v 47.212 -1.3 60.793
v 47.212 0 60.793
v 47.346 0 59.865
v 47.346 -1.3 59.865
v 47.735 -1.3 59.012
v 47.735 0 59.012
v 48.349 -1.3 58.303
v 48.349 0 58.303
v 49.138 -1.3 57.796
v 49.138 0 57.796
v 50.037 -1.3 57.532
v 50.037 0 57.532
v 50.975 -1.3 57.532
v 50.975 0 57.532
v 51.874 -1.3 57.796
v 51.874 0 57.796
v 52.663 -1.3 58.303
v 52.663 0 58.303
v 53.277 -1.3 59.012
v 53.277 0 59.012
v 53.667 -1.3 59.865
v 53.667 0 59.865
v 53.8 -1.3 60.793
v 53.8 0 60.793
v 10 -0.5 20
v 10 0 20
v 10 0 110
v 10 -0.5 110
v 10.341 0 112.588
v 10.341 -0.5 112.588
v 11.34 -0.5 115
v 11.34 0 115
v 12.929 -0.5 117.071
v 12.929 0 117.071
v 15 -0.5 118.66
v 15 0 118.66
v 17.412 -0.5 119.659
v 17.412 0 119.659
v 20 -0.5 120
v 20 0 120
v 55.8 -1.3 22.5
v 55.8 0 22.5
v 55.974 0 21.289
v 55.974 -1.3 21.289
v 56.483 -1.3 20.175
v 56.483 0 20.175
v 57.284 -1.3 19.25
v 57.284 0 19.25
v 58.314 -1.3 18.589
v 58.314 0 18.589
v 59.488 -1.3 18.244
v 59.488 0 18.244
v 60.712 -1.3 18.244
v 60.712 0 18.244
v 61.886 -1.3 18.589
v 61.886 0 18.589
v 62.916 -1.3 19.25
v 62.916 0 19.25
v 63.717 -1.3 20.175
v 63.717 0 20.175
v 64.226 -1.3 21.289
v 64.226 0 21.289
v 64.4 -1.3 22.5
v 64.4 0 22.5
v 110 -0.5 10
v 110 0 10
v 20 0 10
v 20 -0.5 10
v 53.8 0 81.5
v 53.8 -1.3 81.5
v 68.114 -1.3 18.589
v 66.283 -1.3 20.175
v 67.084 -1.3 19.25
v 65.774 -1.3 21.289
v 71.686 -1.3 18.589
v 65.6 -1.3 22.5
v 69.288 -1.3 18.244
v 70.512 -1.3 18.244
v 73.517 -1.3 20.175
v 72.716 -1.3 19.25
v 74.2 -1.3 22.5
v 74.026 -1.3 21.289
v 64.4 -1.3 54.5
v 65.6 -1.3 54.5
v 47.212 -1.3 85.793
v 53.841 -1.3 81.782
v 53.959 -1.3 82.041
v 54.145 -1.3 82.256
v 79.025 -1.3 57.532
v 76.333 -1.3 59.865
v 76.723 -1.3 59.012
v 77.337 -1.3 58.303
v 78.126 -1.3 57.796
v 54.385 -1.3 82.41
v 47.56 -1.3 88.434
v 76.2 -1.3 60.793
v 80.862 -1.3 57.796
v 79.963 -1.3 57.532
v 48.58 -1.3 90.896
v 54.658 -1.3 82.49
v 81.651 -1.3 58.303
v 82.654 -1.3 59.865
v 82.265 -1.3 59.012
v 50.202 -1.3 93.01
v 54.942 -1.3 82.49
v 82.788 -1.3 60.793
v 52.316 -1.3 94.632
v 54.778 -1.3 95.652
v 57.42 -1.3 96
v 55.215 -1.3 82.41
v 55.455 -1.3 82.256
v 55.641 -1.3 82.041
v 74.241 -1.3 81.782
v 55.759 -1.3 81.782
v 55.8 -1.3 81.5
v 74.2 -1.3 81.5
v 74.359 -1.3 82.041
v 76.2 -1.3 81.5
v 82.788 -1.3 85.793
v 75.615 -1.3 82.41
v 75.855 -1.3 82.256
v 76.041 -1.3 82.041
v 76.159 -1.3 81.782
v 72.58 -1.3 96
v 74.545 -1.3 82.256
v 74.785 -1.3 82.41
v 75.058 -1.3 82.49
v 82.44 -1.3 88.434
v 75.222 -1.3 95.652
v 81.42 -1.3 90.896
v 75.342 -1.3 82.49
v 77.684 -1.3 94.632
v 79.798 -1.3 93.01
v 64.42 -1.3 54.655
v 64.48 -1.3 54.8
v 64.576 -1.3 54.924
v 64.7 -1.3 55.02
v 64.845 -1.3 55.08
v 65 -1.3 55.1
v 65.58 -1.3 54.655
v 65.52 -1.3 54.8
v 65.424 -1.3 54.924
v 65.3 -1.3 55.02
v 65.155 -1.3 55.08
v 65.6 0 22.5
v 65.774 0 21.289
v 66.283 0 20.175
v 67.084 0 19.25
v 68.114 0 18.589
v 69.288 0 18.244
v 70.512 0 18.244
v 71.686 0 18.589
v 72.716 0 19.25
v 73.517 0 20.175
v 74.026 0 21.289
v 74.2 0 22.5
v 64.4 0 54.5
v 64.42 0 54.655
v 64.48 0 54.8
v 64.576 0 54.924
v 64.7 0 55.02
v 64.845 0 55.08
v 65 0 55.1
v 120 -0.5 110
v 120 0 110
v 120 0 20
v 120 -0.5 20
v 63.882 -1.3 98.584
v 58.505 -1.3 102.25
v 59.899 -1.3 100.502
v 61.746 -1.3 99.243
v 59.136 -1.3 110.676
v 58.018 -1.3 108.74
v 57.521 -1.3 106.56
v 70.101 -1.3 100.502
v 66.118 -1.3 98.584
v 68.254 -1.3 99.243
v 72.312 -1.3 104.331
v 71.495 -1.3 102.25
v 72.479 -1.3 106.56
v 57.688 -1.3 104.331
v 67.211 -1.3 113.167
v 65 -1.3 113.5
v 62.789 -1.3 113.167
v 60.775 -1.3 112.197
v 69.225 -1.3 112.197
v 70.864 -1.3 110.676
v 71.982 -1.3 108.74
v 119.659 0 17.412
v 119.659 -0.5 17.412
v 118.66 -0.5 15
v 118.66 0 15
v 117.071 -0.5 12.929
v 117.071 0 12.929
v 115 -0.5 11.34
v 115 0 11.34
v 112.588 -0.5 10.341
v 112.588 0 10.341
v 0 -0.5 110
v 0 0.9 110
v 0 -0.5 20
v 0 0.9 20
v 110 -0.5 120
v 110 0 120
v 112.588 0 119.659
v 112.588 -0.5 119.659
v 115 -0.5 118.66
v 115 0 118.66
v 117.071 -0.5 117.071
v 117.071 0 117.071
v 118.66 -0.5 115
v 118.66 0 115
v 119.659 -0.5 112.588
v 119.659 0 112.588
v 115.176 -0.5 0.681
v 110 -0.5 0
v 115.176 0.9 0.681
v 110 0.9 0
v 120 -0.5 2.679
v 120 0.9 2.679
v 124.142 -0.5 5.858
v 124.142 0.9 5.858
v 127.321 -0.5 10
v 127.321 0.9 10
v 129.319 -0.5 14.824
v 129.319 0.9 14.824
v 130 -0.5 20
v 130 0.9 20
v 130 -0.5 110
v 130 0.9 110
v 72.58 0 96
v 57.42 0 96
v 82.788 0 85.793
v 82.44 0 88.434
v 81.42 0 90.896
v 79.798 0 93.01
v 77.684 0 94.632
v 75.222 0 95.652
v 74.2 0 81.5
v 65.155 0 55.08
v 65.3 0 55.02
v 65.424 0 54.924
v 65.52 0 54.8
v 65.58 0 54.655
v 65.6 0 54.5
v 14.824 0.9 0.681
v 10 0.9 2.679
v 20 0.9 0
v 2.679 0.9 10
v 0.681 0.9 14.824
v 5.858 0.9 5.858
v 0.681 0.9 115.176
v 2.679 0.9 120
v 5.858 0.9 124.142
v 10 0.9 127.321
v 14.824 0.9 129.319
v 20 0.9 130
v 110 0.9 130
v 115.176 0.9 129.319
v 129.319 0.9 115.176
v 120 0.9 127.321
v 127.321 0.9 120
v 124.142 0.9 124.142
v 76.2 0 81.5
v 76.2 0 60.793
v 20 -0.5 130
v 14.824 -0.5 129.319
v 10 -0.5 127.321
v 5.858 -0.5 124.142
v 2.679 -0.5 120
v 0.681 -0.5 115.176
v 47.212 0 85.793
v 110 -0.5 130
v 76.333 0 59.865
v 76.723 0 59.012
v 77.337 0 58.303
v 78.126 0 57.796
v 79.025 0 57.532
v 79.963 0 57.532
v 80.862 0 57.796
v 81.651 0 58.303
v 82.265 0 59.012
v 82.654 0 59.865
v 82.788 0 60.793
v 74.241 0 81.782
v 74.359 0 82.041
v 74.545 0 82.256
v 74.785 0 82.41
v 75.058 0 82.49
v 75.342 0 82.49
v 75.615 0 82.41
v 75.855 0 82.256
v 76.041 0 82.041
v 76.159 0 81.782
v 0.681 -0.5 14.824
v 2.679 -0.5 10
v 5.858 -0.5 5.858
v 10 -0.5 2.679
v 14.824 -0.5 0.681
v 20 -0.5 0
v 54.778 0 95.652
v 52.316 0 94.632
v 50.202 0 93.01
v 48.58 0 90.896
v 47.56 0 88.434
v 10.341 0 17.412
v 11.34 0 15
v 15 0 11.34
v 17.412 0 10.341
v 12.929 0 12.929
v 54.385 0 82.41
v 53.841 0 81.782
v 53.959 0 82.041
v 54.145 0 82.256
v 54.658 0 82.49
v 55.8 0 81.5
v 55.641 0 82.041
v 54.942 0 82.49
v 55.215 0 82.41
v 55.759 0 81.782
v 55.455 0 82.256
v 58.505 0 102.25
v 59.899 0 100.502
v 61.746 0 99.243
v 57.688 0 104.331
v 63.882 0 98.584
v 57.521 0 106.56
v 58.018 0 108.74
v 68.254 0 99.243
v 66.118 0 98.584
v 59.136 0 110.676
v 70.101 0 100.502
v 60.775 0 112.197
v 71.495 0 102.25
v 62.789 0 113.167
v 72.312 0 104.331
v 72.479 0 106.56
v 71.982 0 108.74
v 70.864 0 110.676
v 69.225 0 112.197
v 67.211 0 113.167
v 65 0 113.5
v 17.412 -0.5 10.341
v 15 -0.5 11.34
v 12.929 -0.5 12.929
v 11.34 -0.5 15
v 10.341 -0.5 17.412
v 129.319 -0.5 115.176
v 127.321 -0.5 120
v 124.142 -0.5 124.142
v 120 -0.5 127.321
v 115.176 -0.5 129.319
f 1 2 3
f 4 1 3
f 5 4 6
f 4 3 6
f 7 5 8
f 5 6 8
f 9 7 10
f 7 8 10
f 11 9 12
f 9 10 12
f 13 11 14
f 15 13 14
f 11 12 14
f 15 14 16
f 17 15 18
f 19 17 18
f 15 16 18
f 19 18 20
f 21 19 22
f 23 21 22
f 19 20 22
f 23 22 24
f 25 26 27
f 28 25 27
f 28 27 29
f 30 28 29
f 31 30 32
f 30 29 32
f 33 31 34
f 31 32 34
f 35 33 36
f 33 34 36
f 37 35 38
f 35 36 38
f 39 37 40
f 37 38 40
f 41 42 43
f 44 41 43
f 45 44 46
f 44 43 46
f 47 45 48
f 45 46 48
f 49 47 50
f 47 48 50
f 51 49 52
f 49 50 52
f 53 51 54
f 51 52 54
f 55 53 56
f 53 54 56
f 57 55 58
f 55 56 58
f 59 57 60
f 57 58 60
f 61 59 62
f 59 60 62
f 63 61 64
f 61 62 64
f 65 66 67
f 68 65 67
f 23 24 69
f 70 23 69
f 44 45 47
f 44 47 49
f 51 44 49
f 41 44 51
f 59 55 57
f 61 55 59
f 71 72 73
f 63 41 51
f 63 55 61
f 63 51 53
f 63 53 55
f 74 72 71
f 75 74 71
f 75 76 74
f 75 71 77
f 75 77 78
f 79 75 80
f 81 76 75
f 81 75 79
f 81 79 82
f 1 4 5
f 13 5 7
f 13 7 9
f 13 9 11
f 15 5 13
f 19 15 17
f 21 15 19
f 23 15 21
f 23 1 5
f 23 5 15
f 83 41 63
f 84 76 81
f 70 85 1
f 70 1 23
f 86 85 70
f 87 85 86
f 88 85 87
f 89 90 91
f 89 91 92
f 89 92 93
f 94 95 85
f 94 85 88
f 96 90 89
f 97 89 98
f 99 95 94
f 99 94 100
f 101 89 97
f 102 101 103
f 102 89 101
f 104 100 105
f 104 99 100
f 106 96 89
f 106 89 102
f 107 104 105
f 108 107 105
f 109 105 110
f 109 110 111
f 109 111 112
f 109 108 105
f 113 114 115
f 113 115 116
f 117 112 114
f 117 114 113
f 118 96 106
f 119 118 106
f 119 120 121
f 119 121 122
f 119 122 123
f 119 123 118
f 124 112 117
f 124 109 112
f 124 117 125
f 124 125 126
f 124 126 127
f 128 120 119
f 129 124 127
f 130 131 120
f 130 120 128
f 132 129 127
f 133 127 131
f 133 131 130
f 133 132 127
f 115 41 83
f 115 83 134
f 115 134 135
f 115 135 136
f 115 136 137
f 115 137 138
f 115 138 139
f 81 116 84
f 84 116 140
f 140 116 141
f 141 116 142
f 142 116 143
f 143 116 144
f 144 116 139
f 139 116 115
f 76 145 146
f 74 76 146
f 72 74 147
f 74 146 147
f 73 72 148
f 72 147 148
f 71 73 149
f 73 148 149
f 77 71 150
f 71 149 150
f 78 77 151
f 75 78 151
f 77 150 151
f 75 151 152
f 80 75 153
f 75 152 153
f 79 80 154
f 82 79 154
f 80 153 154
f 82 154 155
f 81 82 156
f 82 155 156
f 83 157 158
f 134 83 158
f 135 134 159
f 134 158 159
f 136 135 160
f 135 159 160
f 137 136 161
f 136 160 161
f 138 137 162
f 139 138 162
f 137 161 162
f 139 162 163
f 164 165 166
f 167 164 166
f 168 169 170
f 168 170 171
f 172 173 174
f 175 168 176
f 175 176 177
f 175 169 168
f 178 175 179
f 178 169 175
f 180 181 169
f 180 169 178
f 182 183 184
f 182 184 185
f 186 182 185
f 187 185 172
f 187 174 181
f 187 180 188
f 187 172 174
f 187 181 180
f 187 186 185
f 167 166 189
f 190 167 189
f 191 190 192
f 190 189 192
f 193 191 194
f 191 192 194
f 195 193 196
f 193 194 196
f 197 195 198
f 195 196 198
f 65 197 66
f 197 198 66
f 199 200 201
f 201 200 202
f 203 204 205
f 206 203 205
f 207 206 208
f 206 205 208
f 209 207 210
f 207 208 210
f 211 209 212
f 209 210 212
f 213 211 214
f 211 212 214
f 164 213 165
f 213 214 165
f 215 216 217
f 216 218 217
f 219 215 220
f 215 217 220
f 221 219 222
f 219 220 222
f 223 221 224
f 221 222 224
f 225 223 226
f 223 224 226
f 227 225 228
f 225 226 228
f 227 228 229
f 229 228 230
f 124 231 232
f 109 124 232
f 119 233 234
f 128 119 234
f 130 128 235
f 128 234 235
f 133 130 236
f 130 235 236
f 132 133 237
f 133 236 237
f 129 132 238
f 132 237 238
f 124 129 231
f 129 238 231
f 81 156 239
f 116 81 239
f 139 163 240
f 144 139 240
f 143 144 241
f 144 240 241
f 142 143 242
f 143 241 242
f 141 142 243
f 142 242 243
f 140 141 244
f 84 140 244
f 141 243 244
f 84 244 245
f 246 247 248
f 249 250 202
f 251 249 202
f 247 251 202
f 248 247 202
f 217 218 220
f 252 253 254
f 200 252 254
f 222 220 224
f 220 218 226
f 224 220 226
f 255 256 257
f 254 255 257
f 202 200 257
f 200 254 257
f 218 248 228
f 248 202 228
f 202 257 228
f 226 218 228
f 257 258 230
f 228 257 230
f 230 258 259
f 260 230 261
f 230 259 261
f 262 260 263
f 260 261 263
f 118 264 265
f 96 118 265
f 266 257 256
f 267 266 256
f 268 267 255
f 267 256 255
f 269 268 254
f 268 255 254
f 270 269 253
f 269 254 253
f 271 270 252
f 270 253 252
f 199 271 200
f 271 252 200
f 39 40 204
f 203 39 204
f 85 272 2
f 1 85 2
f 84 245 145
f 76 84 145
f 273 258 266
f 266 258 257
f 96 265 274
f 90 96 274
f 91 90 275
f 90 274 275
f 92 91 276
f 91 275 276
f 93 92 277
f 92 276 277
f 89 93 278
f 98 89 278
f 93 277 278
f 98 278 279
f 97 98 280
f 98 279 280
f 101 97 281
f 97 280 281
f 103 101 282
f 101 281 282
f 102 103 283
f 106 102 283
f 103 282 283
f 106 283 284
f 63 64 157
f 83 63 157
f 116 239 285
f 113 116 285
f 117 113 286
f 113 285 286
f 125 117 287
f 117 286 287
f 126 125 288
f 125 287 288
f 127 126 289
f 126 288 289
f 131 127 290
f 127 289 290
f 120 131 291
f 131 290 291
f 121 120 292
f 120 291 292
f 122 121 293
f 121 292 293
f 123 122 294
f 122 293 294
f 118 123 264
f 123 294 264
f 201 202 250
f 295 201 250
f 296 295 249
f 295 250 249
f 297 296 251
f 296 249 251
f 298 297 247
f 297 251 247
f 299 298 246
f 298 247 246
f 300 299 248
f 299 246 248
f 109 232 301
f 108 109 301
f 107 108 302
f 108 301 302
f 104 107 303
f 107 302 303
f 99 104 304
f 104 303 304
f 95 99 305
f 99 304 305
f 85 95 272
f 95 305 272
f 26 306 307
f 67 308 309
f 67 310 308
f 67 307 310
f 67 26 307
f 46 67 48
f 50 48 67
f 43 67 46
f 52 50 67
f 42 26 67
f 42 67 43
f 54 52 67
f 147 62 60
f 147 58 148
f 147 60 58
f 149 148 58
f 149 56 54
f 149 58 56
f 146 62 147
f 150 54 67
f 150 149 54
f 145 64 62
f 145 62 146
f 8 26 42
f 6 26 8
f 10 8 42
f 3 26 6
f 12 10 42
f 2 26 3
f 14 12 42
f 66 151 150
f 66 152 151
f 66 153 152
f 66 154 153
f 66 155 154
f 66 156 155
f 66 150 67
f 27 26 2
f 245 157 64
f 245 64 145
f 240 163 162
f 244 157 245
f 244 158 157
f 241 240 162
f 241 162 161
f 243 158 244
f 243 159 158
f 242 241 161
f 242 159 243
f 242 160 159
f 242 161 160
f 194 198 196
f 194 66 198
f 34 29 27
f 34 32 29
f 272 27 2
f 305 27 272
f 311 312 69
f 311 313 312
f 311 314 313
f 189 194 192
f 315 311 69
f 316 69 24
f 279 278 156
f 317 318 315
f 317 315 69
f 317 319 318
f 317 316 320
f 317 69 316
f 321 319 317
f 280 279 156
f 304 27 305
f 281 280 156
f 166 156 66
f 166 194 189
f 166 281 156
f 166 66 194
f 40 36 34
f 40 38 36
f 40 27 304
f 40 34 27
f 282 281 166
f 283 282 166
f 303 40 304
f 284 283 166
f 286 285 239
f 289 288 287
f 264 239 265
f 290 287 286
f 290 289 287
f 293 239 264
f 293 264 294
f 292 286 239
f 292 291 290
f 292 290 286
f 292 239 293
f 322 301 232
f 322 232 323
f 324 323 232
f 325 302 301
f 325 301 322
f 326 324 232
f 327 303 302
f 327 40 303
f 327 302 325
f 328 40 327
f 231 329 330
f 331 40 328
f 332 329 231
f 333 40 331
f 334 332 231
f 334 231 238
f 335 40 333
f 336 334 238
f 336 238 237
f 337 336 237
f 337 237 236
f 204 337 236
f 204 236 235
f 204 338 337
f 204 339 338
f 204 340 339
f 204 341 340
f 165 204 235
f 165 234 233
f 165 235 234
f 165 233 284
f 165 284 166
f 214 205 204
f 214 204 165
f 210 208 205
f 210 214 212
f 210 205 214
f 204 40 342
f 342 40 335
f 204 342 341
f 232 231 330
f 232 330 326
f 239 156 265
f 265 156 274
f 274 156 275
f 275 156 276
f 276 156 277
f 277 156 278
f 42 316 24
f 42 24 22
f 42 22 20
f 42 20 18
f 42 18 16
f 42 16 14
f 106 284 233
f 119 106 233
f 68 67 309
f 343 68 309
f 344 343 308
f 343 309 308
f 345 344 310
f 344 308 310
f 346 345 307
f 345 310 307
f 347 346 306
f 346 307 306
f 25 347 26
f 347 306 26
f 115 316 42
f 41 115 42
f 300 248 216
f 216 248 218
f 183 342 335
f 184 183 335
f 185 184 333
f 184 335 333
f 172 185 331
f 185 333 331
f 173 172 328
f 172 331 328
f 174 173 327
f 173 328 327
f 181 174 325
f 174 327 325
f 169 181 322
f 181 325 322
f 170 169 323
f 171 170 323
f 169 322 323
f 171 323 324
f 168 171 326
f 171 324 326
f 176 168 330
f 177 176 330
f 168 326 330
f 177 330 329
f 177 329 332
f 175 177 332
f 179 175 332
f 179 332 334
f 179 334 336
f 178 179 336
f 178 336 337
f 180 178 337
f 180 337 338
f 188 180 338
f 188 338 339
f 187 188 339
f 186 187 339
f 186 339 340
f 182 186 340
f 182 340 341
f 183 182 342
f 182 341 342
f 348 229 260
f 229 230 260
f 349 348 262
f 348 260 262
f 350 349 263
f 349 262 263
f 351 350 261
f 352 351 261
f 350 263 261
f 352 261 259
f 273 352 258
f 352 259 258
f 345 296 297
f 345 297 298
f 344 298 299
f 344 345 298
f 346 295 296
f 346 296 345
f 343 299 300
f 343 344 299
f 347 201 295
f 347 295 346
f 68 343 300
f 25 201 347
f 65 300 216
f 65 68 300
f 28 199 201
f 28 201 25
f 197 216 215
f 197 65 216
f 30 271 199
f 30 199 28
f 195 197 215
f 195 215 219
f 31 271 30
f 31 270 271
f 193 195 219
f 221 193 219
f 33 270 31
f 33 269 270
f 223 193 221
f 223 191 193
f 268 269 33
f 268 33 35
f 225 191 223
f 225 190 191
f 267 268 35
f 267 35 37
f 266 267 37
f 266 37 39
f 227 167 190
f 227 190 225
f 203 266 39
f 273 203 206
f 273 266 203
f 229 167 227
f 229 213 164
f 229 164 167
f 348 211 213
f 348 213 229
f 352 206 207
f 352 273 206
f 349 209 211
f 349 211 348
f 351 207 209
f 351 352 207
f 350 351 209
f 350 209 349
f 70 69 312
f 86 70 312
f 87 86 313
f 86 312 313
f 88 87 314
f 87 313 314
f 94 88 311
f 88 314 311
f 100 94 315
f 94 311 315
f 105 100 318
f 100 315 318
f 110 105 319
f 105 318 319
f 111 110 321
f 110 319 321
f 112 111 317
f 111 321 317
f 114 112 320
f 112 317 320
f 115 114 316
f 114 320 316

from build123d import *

# Parameters (mm, degrees)
F1_DEPTH = 0.9
F2_DEPTH = 0.5
F3_DEPTH = 1.3


with BuildPart() as f1:
    # F0 (on Front) → F1 (new body)
    with BuildSketch(Plane.XZ):
        with BuildLine():
            ThreePointArc((0, 20), (5.857864, 5.857864), (20, 0))
            Line((20, 0), (65, 0))
            Line((65, 0), (110, 0))
            ThreePointArc((110, 0), (124.142136, 5.857864), (130, 20))
            Line((130, 20), (130, 110))
            ThreePointArc((130, 110), (124.142136, 124.142136), (110, 130))
            Line((110, 130), (65, 130))
            Line((65, 130), (20, 130))
            ThreePointArc((20, 130), (5.857864, 124.142136), (0, 110))
            Line((0, 110), (0, 20))
        make_face()
        with BuildLine():
            Line((65, 120), (110, 120))
            ThreePointArc((110, 120), (117.071068, 117.071068), (120, 110))
            Line((120, 110), (120, 20))
            ThreePointArc((120, 20), (117.071068, 12.928932), (110, 10))
            Line((110, 10), (65, 10))
            Line((65, 10), (20, 10))
            ThreePointArc((20, 10), (12.928932, 12.928932), (10, 20))
            Line((10, 20), (10, 110))
            ThreePointArc((10, 110), (12.928932, 117.071068), (20, 120))
            Line((20, 120), (65, 120))
        make_face(mode=Mode.SUBTRACT)
        with BuildLine():
            ThreePointArc((120, 110), (117.071068, 117.071068), (110, 120))
            Line((110, 120), (65, 120))
            Line((65, 120), (20, 120))
            ThreePointArc((20, 120), (12.928932, 117.071068), (10, 110))
            Line((10, 110), (10, 20))
            ThreePointArc((10, 20), (12.928932, 12.928932), (20, 10))
            Line((20, 10), (65, 10))
            Line((65, 10), (110, 10))
            ThreePointArc((110, 10), (117.071068, 12.928932), (120, 20))
            Line((120, 20), (120, 110))
        make_face()
        with BuildLine():
            ThreePointArc((47.212271, 85.792594), (50.201951, 93.01032), (57.419677, 96))
            Line((57.419677, 96), (65, 96))
            Line((65, 96), (72.580323, 96))
            ThreePointArc((72.580323, 96), (79.798049, 93.01032), (82.787729, 85.792594))
            Line((82.787729, 85.792594), (82.787729, 60.792594))
            ThreePointArc((82.787729, 60.792594), (79.493864, 57.498729), (76.2, 60.792594))
            Line((76.2, 60.792594), (76.2, 81.5))
            ThreePointArc((76.2, 81.5), (75.2, 82.5), (74.2, 81.5))
            Line((74.2, 81.5), (74.2, 22.5))
            ThreePointArc((74.2, 22.5), (69.9, 18.2), (65.6, 22.5))
            Line((65.6, 22.5), (65.6, 54.5))
            ThreePointArc((65.6, 54.5), (65.424264, 54.924264), (65, 55.1))
            ThreePointArc((65, 55.1), (64.575736, 54.924264), (64.4, 54.5))
            Line((64.4, 54.5), (64.4, 22.5))
            ThreePointArc((64.4, 22.5), (60.1, 18.2), (55.8, 22.5))
            Line((55.8, 22.5), (55.8, 81.5))
            ThreePointArc((55.8, 81.5), (54.8, 82.5), (53.8, 81.5))
            Line((53.8, 81.5), (53.8, 60.792594))
            ThreePointArc((53.8, 60.792594), (50.506136, 57.498729), (47.212271, 60.792594))
            Line((47.212271, 60.792594), (47.212271, 85.792594))
        make_face(mode=Mode.SUBTRACT)
        with BuildLine():
            ThreePointArc((65, 98.5), (57.5, 106), (65, 113.5))
            ThreePointArc((65, 113.5), (72.5, 106), (65, 98.5))
        make_face(mode=Mode.SUBTRACT)
        with BuildLine():
            Line((65, 96), (57.419677, 96))
            ThreePointArc((57.419677, 96), (50.201951, 93.01032), (47.212271, 85.792594))
            Line((47.212271, 85.792594), (47.212271, 60.792594))
            ThreePointArc((47.212271, 60.792594), (50.506136, 57.498729), (53.8, 60.792594))
            Line((53.8, 60.792594), (53.8, 81.5))
            ThreePointArc((53.8, 81.5), (54.8, 82.5), (55.8, 81.5))
            Line((55.8, 81.5), (55.8, 22.5))
            ThreePointArc((55.8, 22.5), (60.1, 18.2), (64.4, 22.5))
            Line((64.4, 22.5), (64.4, 54.5))
            ThreePointArc((64.4, 54.5), (64.575736, 54.924264), (65, 55.1))
            ThreePointArc((65, 55.1), (65.424264, 54.924264), (65.6, 54.5))
            Line((65.6, 54.5), (65.6, 22.5))
            ThreePointArc((65.6, 22.5), (69.9, 18.2), (74.2, 22.5))
            Line((74.2, 22.5), (74.2, 81.5))
            ThreePointArc((74.2, 81.5), (75.2, 82.5), (76.2, 81.5))
            Line((76.2, 81.5), (76.2, 60.792594))
            ThreePointArc((76.2, 60.792594), (79.493864, 57.498729), (82.787729, 60.792594))
            Line((82.787729, 60.792594), (82.787729, 85.792594))
            ThreePointArc((82.787729, 85.792594), (79.798049, 93.01032), (72.580323, 96))
            Line((72.580323, 96), (65, 96))
        make_face()
        with BuildLine():
            ThreePointArc((65, 98.5), (72.5, 106), (65, 113.5))
            ThreePointArc((65, 113.5), (57.5, 106), (65, 98.5))
        make_face()
    extrude(amount=-F1_DEPTH)

    # F0 (on Front) → F2 (join)
    with BuildSketch(Plane.XZ):
        with BuildLine():
            ThreePointArc((0, 20), (5.857864, 5.857864), (20, 0))
            Line((20, 0), (65, 0))
            Line((65, 0), (110, 0))
            ThreePointArc((110, 0), (124.142136, 5.857864), (130, 20))
            Line((130, 20), (130, 110))
            ThreePointArc((130, 110), (124.142136, 124.142136), (110, 130))
            Line((110, 130), (65, 130))
            Line((65, 130), (20, 130))
            ThreePointArc((20, 130), (5.857864, 124.142136), (0, 110))
            Line((0, 110), (0, 20))
        make_face()
        with BuildLine():
            Line((65, 120), (110, 120))
            ThreePointArc((110, 120), (117.071068, 117.071068), (120, 110))
            Line((120, 110), (120, 20))
            ThreePointArc((120, 20), (117.071068, 12.928932), (110, 10))
            Line((110, 10), (65, 10))
            Line((65, 10), (20, 10))
            ThreePointArc((20, 10), (12.928932, 12.928932), (10, 20))
            Line((10, 20), (10, 110))
            ThreePointArc((10, 110), (12.928932, 117.071068), (20, 120))
            Line((20, 120), (65, 120))
        make_face(mode=Mode.SUBTRACT)
    extrude(amount=F2_DEPTH)

    # F0 (on Front) → F3 (join)
    with BuildSketch(Plane.XZ):
        with BuildLine():
            ThreePointArc((65, 98.5), (72.5, 106), (65, 113.5))
            ThreePointArc((65, 113.5), (57.5, 106), (65, 98.5))
        make_face()
        with BuildLine():
            Line((65, 96), (57.419677, 96))
            ThreePointArc((57.419677, 96), (50.201951, 93.01032), (47.212271, 85.792594))
            Line((47.212271, 85.792594), (47.212271, 60.792594))
            ThreePointArc((47.212271, 60.792594), (50.506136, 57.498729), (53.8, 60.792594))
            Line((53.8, 60.792594), (53.8, 81.5))
            ThreePointArc((53.8, 81.5), (54.8, 82.5), (55.8, 81.5))
            Line((55.8, 81.5), (55.8, 22.5))
            ThreePointArc((55.8, 22.5), (60.1, 18.2), (64.4, 22.5))
            Line((64.4, 22.5), (64.4, 54.5))
            ThreePointArc((64.4, 54.5), (64.575736, 54.924264), (65, 55.1))
            ThreePointArc((65, 55.1), (65.424264, 54.924264), (65.6, 54.5))
            Line((65.6, 54.5), (65.6, 22.5))
            ThreePointArc((65.6, 22.5), (69.9, 18.2), (74.2, 22.5))
            Line((74.2, 22.5), (74.2, 81.5))
            ThreePointArc((74.2, 81.5), (75.2, 82.5), (76.2, 81.5))
            Line((76.2, 81.5), (76.2, 60.792594))
            ThreePointArc((76.2, 60.792594), (79.493864, 57.498729), (82.787729, 60.792594))
            Line((82.787729, 60.792594), (82.787729, 85.792594))
            ThreePointArc((82.787729, 85.792594), (79.798049, 93.01032), (72.580323, 96))
            Line((72.580323, 96), (65, 96))
        make_face()
    extrude(amount=F3_DEPTH)


solid = f1.part
